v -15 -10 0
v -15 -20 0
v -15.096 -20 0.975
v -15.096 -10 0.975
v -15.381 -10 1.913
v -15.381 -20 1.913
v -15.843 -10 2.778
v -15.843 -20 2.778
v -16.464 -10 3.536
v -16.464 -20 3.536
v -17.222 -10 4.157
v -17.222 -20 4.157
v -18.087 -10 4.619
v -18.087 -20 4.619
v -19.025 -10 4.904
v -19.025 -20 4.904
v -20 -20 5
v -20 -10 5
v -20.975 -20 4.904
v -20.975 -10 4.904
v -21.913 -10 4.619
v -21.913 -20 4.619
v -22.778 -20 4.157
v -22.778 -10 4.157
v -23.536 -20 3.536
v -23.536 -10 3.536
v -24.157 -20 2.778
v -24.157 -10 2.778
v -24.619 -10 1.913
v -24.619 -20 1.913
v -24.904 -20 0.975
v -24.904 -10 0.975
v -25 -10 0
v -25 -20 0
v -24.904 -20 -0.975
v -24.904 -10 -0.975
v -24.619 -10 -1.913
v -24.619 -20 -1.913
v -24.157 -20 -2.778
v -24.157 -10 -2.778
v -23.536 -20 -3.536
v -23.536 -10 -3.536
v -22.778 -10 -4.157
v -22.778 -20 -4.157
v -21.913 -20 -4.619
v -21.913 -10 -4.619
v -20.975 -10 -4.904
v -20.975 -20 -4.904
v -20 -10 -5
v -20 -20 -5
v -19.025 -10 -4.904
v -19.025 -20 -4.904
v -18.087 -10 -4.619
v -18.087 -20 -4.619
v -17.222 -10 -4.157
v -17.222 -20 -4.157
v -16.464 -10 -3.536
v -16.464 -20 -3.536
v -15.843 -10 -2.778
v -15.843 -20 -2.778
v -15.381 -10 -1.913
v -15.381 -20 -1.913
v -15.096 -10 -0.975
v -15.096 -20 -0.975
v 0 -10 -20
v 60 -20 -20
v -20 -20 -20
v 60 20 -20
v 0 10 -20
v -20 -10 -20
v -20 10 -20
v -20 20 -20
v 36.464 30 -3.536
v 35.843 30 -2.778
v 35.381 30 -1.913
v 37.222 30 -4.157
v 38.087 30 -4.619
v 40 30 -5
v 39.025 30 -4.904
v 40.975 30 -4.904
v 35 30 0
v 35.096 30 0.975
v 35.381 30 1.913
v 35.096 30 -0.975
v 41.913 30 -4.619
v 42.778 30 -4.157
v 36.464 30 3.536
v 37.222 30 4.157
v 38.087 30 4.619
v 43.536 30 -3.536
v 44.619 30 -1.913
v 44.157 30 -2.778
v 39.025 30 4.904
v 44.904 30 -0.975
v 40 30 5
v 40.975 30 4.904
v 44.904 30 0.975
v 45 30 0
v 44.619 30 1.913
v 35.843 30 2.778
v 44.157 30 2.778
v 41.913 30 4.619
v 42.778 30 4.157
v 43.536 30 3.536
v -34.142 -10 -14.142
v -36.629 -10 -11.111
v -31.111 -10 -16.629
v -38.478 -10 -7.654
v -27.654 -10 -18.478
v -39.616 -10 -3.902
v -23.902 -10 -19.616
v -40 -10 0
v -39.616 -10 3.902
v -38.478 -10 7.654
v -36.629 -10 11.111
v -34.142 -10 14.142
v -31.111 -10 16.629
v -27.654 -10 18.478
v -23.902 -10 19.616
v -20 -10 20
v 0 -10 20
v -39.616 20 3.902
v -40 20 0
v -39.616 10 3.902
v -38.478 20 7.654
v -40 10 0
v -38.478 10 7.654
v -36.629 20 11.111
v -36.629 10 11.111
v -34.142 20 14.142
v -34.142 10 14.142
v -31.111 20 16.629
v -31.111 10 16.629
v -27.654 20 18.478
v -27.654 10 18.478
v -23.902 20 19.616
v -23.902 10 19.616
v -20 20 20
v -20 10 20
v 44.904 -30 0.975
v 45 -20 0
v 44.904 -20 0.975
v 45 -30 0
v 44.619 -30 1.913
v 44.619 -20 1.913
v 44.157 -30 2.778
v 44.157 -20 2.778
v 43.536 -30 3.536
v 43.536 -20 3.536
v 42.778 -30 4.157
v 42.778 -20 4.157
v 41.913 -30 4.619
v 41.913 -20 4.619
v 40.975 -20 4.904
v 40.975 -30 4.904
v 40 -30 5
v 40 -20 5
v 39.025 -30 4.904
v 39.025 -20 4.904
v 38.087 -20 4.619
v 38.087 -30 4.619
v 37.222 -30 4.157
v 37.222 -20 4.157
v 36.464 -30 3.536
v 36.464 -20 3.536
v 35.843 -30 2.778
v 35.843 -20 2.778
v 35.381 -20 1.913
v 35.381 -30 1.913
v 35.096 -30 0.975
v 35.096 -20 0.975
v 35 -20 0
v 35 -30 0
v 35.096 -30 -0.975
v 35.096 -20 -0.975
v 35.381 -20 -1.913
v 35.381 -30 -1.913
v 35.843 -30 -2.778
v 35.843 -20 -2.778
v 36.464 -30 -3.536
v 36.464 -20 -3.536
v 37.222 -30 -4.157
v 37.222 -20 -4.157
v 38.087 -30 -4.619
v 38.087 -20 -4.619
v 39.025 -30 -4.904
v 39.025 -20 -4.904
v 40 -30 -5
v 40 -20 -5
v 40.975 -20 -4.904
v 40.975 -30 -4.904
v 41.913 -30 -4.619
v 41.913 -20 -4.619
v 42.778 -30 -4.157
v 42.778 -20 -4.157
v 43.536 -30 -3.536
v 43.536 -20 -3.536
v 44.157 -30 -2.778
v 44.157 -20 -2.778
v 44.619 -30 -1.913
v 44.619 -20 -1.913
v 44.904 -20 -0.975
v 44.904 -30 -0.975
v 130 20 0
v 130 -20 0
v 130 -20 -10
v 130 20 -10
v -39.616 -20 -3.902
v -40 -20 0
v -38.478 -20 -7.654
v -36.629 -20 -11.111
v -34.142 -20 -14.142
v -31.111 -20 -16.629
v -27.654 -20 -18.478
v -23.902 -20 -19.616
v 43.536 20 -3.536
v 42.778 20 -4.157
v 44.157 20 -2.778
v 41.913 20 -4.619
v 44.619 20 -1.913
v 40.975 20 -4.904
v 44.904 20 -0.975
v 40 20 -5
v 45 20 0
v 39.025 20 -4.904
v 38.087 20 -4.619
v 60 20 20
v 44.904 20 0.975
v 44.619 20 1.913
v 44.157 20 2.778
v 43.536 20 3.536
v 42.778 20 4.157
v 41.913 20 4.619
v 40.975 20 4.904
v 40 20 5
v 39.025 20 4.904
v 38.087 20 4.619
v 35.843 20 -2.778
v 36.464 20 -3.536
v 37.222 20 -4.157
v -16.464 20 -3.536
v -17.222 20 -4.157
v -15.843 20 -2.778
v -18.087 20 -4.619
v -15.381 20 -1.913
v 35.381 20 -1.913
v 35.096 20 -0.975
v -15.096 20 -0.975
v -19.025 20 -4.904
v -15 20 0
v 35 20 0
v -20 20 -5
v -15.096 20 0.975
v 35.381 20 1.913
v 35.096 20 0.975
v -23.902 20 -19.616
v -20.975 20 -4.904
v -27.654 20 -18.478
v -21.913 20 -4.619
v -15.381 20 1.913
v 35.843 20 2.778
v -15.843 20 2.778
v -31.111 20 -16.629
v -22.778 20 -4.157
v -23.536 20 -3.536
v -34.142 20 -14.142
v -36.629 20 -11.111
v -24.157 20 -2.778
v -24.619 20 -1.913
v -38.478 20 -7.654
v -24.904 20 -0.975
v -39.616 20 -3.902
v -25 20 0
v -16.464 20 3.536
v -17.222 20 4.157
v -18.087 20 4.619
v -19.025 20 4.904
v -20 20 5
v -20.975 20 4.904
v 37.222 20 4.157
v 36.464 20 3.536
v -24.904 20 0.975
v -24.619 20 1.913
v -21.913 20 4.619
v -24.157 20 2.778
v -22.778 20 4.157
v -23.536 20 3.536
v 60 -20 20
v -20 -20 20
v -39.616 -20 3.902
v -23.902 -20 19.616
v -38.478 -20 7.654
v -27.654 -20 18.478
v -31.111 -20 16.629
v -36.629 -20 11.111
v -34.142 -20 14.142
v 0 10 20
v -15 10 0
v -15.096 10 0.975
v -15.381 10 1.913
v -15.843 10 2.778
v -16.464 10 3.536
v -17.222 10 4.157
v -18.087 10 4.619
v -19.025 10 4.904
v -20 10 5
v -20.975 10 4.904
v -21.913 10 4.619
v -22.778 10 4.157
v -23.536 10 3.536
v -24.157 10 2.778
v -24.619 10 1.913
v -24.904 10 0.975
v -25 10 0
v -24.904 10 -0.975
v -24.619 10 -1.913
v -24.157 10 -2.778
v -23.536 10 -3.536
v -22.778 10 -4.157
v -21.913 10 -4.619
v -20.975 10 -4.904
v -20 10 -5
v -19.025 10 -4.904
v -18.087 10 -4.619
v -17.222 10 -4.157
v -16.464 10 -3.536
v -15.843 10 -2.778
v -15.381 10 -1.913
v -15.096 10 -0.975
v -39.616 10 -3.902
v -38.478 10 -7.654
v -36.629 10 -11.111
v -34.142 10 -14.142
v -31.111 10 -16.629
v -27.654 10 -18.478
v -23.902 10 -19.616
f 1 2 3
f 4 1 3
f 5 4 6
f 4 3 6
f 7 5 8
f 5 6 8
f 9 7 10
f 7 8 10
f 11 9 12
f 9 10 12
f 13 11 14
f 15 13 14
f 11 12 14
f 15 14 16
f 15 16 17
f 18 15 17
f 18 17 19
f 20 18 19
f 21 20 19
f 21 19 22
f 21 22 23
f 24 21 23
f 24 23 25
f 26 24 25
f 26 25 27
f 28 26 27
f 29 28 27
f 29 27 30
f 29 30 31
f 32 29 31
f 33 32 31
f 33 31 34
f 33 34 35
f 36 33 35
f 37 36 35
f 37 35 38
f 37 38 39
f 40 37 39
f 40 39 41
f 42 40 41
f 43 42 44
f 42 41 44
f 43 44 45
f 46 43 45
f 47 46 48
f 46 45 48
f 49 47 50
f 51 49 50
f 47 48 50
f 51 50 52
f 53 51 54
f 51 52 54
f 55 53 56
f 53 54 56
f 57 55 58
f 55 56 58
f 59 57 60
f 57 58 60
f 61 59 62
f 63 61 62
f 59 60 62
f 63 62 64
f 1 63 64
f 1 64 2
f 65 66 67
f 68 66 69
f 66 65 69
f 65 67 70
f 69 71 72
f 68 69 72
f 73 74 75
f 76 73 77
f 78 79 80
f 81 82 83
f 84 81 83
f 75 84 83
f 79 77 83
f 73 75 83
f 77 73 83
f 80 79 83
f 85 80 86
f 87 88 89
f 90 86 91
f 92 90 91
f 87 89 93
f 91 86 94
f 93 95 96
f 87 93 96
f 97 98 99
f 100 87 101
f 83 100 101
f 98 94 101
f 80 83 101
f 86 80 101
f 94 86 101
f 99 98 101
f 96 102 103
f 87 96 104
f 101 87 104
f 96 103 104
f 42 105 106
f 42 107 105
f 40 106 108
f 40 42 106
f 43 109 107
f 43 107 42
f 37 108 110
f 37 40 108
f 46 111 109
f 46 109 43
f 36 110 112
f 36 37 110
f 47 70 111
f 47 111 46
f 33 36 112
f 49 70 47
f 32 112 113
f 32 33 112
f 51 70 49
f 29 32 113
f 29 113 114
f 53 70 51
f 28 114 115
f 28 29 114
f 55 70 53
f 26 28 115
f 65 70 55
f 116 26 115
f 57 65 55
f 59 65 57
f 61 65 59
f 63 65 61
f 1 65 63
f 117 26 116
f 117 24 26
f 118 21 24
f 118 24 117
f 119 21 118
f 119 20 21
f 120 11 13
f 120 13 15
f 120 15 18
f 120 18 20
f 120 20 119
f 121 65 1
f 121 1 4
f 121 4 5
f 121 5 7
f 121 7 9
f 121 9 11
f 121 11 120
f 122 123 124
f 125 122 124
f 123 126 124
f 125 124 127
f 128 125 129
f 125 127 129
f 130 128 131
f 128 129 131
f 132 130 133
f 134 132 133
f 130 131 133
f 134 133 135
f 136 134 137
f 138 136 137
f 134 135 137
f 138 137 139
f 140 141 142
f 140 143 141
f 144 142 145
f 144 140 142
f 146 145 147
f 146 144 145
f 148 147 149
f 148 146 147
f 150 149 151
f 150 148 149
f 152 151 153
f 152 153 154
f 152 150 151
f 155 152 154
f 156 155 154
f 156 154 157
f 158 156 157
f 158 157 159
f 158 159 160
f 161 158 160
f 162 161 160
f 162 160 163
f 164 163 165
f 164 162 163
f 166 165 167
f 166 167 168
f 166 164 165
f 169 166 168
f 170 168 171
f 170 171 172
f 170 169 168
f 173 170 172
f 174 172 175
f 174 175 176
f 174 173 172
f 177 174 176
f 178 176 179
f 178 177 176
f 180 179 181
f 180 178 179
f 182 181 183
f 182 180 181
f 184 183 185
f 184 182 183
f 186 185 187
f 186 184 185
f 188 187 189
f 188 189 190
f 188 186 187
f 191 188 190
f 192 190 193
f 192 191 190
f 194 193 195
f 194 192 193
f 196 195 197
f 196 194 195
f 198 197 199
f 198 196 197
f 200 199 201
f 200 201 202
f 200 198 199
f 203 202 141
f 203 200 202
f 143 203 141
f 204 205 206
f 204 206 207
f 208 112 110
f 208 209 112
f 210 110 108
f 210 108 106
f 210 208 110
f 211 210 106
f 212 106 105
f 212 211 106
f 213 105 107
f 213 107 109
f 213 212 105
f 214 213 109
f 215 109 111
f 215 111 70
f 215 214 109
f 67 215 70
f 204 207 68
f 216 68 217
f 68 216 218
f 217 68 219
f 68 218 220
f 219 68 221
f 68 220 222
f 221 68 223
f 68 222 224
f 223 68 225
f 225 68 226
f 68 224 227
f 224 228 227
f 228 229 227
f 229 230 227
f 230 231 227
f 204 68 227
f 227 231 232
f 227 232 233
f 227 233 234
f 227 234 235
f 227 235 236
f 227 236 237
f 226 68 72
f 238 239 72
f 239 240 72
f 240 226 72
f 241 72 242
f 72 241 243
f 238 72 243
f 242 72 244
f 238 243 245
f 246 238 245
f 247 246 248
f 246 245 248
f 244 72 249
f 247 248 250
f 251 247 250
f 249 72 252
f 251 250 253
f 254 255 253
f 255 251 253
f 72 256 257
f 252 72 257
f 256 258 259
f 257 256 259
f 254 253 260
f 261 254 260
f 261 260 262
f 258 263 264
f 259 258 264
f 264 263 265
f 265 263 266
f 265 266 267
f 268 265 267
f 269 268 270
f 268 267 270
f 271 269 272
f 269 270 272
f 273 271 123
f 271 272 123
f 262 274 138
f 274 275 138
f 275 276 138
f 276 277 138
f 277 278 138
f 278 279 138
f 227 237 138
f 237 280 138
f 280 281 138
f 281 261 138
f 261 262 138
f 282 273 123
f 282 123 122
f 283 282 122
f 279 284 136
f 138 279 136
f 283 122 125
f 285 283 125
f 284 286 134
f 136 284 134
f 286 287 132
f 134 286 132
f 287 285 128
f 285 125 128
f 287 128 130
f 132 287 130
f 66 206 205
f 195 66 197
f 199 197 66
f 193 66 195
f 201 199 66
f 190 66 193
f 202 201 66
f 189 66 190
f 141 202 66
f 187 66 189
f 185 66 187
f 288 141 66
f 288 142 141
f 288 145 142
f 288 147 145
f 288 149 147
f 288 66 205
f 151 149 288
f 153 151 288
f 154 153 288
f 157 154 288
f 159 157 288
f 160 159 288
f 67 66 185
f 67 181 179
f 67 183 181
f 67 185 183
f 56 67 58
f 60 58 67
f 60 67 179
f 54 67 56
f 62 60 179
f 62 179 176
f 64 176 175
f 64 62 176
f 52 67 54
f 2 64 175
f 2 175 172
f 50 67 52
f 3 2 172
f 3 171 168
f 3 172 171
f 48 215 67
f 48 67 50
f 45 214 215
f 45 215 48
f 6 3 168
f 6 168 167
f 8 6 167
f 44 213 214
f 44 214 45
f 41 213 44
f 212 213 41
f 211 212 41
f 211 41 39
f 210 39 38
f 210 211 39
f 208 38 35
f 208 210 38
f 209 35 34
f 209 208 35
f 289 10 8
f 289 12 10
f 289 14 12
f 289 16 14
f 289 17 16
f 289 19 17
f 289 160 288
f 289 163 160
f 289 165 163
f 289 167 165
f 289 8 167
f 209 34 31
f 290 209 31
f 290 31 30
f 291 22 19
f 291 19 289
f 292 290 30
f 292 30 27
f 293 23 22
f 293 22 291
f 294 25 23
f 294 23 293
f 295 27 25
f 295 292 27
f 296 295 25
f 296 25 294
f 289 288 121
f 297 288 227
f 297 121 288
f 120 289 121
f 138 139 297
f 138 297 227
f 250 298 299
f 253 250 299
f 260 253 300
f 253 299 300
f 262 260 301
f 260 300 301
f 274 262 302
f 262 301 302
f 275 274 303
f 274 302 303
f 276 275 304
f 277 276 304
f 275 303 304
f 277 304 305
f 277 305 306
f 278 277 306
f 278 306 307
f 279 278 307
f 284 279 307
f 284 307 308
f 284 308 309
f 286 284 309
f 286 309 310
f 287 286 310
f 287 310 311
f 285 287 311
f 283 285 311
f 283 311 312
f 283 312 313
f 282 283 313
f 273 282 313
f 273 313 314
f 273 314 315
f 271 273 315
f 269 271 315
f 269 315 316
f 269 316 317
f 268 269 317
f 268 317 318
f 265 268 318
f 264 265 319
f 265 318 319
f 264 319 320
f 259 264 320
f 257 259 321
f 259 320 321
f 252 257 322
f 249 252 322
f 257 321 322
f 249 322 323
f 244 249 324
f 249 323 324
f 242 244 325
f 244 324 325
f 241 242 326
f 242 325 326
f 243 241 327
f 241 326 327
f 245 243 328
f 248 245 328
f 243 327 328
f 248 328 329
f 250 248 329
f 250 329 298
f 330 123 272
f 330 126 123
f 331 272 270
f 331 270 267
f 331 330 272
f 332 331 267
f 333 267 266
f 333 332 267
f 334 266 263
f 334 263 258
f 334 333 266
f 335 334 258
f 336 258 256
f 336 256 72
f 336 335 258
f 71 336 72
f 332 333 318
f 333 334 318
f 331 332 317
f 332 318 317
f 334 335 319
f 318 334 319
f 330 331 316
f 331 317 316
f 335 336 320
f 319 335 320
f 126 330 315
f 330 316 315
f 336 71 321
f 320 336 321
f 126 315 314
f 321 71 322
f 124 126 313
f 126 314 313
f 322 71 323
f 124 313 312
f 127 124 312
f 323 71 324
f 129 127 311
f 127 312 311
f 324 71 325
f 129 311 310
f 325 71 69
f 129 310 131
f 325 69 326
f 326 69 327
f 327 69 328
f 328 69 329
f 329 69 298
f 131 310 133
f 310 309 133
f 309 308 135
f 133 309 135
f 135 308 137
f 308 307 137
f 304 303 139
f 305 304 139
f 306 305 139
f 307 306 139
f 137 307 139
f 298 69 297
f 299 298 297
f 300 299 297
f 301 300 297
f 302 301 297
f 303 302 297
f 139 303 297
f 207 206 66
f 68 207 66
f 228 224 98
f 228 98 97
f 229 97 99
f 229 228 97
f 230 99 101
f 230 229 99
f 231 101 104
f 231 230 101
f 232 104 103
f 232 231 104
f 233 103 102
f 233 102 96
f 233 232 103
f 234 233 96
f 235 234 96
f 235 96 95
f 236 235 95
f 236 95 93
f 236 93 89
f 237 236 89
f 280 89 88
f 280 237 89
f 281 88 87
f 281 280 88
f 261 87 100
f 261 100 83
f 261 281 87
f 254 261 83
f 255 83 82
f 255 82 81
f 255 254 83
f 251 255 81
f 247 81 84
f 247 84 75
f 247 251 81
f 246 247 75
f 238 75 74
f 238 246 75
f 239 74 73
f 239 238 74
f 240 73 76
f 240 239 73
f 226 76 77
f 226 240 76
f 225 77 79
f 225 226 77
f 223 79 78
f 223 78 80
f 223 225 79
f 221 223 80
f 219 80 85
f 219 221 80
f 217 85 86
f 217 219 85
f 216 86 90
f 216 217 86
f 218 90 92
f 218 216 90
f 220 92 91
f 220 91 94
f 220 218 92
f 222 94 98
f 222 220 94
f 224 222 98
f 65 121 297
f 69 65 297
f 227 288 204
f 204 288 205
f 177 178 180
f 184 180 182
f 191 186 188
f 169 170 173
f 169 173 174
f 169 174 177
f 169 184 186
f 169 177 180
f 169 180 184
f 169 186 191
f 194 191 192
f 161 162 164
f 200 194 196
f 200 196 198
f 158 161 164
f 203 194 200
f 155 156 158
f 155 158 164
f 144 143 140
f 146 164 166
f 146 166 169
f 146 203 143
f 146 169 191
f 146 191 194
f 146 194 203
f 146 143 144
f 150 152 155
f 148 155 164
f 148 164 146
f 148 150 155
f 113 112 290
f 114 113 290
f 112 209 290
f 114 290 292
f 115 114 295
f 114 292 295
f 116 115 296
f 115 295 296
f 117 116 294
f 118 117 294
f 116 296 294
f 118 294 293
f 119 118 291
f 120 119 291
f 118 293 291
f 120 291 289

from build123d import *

# Parameters (mm, degrees)
F0_W      = 40
F0_H      = 40
F1_DEPTH  = 80
F2_W      = 10
F2_H      = 40
F3_DEPTH  = 40
F4_R      = 19.99999
F5_R      = 5
F6_DEPTH  = 40.001
F7_R      = 5
F8_DEPTH  = 30
F9_W      = 40
F9_H      = 40
F10_DEPTH = 50
F12_DEPTH = 50.001


# Not quite as in the source:
# - a fillet or chamfer is up to 0.001 mm smaller than in the source, because OpenCascade refuses the exact size


with BuildPart() as f1:
    # F0 (on Right) → F1 (new body)
    with BuildSketch(Plane.YZ):
        Rectangle(F0_W, F0_H)
    extrude(amount=F1_DEPTH)

    # F2 (on face) → F3 (join)
    with BuildSketch(Plane(origin=(0, 0, 0), x_dir=(0, -1, 0), z_dir=(-1, 0, 0))):
        with Locations((15, 0)):
            Rectangle(F2_W, F2_H)
        with Locations((-15, 0)):
            Rectangle(F2_W, F2_H)
    extrude(amount=F3_DEPTH)

    # F4 (radius 20 in the source; OpenCascade refuses exactly that, so slightly less here)
    f4_edges = [f1.edges().sort_by_distance(p)[0] for p in [
        (-40, 15, 20),
        (-40, 15, -20),
        (-40, -15, 20),
        (-40, -15, -20),
    ]]
    fillet(f4_edges, radius=F4_R)

    # F5 (on face) → F6 (cut, through all)
    with BuildSketch(Plane.XZ.offset(20)):
        with Locations((-20, 0)):
            Circle(F5_R)
    extrude(amount=-F6_DEPTH, mode=Mode.SUBTRACT)

    # F7 (on Front) → F8 (join, symmetric)
    with BuildSketch(Plane.XZ):
        with Locations((40, 0)):
            Circle(F7_R)
    extrude(amount=F8_DEPTH, both=True)

    # F9 (on face) → F10 (join)
    with BuildSketch(Plane.YZ.offset(80)):
        Rectangle(F9_W, F9_H)
    extrude(amount=F10_DEPTH)

    # F11 (on face) → F12 (cut, through all)
    with BuildSketch(Plane.XZ.offset(20)):
        Polygon((60, 20), (130, 0), (130, 20), align=None)
        Polygon((130, -20), (130, -10), (60, -20), align=None)
    extrude(amount=-F12_DEPTH, mode=Mode.SUBTRACT)


solid = f1.part
